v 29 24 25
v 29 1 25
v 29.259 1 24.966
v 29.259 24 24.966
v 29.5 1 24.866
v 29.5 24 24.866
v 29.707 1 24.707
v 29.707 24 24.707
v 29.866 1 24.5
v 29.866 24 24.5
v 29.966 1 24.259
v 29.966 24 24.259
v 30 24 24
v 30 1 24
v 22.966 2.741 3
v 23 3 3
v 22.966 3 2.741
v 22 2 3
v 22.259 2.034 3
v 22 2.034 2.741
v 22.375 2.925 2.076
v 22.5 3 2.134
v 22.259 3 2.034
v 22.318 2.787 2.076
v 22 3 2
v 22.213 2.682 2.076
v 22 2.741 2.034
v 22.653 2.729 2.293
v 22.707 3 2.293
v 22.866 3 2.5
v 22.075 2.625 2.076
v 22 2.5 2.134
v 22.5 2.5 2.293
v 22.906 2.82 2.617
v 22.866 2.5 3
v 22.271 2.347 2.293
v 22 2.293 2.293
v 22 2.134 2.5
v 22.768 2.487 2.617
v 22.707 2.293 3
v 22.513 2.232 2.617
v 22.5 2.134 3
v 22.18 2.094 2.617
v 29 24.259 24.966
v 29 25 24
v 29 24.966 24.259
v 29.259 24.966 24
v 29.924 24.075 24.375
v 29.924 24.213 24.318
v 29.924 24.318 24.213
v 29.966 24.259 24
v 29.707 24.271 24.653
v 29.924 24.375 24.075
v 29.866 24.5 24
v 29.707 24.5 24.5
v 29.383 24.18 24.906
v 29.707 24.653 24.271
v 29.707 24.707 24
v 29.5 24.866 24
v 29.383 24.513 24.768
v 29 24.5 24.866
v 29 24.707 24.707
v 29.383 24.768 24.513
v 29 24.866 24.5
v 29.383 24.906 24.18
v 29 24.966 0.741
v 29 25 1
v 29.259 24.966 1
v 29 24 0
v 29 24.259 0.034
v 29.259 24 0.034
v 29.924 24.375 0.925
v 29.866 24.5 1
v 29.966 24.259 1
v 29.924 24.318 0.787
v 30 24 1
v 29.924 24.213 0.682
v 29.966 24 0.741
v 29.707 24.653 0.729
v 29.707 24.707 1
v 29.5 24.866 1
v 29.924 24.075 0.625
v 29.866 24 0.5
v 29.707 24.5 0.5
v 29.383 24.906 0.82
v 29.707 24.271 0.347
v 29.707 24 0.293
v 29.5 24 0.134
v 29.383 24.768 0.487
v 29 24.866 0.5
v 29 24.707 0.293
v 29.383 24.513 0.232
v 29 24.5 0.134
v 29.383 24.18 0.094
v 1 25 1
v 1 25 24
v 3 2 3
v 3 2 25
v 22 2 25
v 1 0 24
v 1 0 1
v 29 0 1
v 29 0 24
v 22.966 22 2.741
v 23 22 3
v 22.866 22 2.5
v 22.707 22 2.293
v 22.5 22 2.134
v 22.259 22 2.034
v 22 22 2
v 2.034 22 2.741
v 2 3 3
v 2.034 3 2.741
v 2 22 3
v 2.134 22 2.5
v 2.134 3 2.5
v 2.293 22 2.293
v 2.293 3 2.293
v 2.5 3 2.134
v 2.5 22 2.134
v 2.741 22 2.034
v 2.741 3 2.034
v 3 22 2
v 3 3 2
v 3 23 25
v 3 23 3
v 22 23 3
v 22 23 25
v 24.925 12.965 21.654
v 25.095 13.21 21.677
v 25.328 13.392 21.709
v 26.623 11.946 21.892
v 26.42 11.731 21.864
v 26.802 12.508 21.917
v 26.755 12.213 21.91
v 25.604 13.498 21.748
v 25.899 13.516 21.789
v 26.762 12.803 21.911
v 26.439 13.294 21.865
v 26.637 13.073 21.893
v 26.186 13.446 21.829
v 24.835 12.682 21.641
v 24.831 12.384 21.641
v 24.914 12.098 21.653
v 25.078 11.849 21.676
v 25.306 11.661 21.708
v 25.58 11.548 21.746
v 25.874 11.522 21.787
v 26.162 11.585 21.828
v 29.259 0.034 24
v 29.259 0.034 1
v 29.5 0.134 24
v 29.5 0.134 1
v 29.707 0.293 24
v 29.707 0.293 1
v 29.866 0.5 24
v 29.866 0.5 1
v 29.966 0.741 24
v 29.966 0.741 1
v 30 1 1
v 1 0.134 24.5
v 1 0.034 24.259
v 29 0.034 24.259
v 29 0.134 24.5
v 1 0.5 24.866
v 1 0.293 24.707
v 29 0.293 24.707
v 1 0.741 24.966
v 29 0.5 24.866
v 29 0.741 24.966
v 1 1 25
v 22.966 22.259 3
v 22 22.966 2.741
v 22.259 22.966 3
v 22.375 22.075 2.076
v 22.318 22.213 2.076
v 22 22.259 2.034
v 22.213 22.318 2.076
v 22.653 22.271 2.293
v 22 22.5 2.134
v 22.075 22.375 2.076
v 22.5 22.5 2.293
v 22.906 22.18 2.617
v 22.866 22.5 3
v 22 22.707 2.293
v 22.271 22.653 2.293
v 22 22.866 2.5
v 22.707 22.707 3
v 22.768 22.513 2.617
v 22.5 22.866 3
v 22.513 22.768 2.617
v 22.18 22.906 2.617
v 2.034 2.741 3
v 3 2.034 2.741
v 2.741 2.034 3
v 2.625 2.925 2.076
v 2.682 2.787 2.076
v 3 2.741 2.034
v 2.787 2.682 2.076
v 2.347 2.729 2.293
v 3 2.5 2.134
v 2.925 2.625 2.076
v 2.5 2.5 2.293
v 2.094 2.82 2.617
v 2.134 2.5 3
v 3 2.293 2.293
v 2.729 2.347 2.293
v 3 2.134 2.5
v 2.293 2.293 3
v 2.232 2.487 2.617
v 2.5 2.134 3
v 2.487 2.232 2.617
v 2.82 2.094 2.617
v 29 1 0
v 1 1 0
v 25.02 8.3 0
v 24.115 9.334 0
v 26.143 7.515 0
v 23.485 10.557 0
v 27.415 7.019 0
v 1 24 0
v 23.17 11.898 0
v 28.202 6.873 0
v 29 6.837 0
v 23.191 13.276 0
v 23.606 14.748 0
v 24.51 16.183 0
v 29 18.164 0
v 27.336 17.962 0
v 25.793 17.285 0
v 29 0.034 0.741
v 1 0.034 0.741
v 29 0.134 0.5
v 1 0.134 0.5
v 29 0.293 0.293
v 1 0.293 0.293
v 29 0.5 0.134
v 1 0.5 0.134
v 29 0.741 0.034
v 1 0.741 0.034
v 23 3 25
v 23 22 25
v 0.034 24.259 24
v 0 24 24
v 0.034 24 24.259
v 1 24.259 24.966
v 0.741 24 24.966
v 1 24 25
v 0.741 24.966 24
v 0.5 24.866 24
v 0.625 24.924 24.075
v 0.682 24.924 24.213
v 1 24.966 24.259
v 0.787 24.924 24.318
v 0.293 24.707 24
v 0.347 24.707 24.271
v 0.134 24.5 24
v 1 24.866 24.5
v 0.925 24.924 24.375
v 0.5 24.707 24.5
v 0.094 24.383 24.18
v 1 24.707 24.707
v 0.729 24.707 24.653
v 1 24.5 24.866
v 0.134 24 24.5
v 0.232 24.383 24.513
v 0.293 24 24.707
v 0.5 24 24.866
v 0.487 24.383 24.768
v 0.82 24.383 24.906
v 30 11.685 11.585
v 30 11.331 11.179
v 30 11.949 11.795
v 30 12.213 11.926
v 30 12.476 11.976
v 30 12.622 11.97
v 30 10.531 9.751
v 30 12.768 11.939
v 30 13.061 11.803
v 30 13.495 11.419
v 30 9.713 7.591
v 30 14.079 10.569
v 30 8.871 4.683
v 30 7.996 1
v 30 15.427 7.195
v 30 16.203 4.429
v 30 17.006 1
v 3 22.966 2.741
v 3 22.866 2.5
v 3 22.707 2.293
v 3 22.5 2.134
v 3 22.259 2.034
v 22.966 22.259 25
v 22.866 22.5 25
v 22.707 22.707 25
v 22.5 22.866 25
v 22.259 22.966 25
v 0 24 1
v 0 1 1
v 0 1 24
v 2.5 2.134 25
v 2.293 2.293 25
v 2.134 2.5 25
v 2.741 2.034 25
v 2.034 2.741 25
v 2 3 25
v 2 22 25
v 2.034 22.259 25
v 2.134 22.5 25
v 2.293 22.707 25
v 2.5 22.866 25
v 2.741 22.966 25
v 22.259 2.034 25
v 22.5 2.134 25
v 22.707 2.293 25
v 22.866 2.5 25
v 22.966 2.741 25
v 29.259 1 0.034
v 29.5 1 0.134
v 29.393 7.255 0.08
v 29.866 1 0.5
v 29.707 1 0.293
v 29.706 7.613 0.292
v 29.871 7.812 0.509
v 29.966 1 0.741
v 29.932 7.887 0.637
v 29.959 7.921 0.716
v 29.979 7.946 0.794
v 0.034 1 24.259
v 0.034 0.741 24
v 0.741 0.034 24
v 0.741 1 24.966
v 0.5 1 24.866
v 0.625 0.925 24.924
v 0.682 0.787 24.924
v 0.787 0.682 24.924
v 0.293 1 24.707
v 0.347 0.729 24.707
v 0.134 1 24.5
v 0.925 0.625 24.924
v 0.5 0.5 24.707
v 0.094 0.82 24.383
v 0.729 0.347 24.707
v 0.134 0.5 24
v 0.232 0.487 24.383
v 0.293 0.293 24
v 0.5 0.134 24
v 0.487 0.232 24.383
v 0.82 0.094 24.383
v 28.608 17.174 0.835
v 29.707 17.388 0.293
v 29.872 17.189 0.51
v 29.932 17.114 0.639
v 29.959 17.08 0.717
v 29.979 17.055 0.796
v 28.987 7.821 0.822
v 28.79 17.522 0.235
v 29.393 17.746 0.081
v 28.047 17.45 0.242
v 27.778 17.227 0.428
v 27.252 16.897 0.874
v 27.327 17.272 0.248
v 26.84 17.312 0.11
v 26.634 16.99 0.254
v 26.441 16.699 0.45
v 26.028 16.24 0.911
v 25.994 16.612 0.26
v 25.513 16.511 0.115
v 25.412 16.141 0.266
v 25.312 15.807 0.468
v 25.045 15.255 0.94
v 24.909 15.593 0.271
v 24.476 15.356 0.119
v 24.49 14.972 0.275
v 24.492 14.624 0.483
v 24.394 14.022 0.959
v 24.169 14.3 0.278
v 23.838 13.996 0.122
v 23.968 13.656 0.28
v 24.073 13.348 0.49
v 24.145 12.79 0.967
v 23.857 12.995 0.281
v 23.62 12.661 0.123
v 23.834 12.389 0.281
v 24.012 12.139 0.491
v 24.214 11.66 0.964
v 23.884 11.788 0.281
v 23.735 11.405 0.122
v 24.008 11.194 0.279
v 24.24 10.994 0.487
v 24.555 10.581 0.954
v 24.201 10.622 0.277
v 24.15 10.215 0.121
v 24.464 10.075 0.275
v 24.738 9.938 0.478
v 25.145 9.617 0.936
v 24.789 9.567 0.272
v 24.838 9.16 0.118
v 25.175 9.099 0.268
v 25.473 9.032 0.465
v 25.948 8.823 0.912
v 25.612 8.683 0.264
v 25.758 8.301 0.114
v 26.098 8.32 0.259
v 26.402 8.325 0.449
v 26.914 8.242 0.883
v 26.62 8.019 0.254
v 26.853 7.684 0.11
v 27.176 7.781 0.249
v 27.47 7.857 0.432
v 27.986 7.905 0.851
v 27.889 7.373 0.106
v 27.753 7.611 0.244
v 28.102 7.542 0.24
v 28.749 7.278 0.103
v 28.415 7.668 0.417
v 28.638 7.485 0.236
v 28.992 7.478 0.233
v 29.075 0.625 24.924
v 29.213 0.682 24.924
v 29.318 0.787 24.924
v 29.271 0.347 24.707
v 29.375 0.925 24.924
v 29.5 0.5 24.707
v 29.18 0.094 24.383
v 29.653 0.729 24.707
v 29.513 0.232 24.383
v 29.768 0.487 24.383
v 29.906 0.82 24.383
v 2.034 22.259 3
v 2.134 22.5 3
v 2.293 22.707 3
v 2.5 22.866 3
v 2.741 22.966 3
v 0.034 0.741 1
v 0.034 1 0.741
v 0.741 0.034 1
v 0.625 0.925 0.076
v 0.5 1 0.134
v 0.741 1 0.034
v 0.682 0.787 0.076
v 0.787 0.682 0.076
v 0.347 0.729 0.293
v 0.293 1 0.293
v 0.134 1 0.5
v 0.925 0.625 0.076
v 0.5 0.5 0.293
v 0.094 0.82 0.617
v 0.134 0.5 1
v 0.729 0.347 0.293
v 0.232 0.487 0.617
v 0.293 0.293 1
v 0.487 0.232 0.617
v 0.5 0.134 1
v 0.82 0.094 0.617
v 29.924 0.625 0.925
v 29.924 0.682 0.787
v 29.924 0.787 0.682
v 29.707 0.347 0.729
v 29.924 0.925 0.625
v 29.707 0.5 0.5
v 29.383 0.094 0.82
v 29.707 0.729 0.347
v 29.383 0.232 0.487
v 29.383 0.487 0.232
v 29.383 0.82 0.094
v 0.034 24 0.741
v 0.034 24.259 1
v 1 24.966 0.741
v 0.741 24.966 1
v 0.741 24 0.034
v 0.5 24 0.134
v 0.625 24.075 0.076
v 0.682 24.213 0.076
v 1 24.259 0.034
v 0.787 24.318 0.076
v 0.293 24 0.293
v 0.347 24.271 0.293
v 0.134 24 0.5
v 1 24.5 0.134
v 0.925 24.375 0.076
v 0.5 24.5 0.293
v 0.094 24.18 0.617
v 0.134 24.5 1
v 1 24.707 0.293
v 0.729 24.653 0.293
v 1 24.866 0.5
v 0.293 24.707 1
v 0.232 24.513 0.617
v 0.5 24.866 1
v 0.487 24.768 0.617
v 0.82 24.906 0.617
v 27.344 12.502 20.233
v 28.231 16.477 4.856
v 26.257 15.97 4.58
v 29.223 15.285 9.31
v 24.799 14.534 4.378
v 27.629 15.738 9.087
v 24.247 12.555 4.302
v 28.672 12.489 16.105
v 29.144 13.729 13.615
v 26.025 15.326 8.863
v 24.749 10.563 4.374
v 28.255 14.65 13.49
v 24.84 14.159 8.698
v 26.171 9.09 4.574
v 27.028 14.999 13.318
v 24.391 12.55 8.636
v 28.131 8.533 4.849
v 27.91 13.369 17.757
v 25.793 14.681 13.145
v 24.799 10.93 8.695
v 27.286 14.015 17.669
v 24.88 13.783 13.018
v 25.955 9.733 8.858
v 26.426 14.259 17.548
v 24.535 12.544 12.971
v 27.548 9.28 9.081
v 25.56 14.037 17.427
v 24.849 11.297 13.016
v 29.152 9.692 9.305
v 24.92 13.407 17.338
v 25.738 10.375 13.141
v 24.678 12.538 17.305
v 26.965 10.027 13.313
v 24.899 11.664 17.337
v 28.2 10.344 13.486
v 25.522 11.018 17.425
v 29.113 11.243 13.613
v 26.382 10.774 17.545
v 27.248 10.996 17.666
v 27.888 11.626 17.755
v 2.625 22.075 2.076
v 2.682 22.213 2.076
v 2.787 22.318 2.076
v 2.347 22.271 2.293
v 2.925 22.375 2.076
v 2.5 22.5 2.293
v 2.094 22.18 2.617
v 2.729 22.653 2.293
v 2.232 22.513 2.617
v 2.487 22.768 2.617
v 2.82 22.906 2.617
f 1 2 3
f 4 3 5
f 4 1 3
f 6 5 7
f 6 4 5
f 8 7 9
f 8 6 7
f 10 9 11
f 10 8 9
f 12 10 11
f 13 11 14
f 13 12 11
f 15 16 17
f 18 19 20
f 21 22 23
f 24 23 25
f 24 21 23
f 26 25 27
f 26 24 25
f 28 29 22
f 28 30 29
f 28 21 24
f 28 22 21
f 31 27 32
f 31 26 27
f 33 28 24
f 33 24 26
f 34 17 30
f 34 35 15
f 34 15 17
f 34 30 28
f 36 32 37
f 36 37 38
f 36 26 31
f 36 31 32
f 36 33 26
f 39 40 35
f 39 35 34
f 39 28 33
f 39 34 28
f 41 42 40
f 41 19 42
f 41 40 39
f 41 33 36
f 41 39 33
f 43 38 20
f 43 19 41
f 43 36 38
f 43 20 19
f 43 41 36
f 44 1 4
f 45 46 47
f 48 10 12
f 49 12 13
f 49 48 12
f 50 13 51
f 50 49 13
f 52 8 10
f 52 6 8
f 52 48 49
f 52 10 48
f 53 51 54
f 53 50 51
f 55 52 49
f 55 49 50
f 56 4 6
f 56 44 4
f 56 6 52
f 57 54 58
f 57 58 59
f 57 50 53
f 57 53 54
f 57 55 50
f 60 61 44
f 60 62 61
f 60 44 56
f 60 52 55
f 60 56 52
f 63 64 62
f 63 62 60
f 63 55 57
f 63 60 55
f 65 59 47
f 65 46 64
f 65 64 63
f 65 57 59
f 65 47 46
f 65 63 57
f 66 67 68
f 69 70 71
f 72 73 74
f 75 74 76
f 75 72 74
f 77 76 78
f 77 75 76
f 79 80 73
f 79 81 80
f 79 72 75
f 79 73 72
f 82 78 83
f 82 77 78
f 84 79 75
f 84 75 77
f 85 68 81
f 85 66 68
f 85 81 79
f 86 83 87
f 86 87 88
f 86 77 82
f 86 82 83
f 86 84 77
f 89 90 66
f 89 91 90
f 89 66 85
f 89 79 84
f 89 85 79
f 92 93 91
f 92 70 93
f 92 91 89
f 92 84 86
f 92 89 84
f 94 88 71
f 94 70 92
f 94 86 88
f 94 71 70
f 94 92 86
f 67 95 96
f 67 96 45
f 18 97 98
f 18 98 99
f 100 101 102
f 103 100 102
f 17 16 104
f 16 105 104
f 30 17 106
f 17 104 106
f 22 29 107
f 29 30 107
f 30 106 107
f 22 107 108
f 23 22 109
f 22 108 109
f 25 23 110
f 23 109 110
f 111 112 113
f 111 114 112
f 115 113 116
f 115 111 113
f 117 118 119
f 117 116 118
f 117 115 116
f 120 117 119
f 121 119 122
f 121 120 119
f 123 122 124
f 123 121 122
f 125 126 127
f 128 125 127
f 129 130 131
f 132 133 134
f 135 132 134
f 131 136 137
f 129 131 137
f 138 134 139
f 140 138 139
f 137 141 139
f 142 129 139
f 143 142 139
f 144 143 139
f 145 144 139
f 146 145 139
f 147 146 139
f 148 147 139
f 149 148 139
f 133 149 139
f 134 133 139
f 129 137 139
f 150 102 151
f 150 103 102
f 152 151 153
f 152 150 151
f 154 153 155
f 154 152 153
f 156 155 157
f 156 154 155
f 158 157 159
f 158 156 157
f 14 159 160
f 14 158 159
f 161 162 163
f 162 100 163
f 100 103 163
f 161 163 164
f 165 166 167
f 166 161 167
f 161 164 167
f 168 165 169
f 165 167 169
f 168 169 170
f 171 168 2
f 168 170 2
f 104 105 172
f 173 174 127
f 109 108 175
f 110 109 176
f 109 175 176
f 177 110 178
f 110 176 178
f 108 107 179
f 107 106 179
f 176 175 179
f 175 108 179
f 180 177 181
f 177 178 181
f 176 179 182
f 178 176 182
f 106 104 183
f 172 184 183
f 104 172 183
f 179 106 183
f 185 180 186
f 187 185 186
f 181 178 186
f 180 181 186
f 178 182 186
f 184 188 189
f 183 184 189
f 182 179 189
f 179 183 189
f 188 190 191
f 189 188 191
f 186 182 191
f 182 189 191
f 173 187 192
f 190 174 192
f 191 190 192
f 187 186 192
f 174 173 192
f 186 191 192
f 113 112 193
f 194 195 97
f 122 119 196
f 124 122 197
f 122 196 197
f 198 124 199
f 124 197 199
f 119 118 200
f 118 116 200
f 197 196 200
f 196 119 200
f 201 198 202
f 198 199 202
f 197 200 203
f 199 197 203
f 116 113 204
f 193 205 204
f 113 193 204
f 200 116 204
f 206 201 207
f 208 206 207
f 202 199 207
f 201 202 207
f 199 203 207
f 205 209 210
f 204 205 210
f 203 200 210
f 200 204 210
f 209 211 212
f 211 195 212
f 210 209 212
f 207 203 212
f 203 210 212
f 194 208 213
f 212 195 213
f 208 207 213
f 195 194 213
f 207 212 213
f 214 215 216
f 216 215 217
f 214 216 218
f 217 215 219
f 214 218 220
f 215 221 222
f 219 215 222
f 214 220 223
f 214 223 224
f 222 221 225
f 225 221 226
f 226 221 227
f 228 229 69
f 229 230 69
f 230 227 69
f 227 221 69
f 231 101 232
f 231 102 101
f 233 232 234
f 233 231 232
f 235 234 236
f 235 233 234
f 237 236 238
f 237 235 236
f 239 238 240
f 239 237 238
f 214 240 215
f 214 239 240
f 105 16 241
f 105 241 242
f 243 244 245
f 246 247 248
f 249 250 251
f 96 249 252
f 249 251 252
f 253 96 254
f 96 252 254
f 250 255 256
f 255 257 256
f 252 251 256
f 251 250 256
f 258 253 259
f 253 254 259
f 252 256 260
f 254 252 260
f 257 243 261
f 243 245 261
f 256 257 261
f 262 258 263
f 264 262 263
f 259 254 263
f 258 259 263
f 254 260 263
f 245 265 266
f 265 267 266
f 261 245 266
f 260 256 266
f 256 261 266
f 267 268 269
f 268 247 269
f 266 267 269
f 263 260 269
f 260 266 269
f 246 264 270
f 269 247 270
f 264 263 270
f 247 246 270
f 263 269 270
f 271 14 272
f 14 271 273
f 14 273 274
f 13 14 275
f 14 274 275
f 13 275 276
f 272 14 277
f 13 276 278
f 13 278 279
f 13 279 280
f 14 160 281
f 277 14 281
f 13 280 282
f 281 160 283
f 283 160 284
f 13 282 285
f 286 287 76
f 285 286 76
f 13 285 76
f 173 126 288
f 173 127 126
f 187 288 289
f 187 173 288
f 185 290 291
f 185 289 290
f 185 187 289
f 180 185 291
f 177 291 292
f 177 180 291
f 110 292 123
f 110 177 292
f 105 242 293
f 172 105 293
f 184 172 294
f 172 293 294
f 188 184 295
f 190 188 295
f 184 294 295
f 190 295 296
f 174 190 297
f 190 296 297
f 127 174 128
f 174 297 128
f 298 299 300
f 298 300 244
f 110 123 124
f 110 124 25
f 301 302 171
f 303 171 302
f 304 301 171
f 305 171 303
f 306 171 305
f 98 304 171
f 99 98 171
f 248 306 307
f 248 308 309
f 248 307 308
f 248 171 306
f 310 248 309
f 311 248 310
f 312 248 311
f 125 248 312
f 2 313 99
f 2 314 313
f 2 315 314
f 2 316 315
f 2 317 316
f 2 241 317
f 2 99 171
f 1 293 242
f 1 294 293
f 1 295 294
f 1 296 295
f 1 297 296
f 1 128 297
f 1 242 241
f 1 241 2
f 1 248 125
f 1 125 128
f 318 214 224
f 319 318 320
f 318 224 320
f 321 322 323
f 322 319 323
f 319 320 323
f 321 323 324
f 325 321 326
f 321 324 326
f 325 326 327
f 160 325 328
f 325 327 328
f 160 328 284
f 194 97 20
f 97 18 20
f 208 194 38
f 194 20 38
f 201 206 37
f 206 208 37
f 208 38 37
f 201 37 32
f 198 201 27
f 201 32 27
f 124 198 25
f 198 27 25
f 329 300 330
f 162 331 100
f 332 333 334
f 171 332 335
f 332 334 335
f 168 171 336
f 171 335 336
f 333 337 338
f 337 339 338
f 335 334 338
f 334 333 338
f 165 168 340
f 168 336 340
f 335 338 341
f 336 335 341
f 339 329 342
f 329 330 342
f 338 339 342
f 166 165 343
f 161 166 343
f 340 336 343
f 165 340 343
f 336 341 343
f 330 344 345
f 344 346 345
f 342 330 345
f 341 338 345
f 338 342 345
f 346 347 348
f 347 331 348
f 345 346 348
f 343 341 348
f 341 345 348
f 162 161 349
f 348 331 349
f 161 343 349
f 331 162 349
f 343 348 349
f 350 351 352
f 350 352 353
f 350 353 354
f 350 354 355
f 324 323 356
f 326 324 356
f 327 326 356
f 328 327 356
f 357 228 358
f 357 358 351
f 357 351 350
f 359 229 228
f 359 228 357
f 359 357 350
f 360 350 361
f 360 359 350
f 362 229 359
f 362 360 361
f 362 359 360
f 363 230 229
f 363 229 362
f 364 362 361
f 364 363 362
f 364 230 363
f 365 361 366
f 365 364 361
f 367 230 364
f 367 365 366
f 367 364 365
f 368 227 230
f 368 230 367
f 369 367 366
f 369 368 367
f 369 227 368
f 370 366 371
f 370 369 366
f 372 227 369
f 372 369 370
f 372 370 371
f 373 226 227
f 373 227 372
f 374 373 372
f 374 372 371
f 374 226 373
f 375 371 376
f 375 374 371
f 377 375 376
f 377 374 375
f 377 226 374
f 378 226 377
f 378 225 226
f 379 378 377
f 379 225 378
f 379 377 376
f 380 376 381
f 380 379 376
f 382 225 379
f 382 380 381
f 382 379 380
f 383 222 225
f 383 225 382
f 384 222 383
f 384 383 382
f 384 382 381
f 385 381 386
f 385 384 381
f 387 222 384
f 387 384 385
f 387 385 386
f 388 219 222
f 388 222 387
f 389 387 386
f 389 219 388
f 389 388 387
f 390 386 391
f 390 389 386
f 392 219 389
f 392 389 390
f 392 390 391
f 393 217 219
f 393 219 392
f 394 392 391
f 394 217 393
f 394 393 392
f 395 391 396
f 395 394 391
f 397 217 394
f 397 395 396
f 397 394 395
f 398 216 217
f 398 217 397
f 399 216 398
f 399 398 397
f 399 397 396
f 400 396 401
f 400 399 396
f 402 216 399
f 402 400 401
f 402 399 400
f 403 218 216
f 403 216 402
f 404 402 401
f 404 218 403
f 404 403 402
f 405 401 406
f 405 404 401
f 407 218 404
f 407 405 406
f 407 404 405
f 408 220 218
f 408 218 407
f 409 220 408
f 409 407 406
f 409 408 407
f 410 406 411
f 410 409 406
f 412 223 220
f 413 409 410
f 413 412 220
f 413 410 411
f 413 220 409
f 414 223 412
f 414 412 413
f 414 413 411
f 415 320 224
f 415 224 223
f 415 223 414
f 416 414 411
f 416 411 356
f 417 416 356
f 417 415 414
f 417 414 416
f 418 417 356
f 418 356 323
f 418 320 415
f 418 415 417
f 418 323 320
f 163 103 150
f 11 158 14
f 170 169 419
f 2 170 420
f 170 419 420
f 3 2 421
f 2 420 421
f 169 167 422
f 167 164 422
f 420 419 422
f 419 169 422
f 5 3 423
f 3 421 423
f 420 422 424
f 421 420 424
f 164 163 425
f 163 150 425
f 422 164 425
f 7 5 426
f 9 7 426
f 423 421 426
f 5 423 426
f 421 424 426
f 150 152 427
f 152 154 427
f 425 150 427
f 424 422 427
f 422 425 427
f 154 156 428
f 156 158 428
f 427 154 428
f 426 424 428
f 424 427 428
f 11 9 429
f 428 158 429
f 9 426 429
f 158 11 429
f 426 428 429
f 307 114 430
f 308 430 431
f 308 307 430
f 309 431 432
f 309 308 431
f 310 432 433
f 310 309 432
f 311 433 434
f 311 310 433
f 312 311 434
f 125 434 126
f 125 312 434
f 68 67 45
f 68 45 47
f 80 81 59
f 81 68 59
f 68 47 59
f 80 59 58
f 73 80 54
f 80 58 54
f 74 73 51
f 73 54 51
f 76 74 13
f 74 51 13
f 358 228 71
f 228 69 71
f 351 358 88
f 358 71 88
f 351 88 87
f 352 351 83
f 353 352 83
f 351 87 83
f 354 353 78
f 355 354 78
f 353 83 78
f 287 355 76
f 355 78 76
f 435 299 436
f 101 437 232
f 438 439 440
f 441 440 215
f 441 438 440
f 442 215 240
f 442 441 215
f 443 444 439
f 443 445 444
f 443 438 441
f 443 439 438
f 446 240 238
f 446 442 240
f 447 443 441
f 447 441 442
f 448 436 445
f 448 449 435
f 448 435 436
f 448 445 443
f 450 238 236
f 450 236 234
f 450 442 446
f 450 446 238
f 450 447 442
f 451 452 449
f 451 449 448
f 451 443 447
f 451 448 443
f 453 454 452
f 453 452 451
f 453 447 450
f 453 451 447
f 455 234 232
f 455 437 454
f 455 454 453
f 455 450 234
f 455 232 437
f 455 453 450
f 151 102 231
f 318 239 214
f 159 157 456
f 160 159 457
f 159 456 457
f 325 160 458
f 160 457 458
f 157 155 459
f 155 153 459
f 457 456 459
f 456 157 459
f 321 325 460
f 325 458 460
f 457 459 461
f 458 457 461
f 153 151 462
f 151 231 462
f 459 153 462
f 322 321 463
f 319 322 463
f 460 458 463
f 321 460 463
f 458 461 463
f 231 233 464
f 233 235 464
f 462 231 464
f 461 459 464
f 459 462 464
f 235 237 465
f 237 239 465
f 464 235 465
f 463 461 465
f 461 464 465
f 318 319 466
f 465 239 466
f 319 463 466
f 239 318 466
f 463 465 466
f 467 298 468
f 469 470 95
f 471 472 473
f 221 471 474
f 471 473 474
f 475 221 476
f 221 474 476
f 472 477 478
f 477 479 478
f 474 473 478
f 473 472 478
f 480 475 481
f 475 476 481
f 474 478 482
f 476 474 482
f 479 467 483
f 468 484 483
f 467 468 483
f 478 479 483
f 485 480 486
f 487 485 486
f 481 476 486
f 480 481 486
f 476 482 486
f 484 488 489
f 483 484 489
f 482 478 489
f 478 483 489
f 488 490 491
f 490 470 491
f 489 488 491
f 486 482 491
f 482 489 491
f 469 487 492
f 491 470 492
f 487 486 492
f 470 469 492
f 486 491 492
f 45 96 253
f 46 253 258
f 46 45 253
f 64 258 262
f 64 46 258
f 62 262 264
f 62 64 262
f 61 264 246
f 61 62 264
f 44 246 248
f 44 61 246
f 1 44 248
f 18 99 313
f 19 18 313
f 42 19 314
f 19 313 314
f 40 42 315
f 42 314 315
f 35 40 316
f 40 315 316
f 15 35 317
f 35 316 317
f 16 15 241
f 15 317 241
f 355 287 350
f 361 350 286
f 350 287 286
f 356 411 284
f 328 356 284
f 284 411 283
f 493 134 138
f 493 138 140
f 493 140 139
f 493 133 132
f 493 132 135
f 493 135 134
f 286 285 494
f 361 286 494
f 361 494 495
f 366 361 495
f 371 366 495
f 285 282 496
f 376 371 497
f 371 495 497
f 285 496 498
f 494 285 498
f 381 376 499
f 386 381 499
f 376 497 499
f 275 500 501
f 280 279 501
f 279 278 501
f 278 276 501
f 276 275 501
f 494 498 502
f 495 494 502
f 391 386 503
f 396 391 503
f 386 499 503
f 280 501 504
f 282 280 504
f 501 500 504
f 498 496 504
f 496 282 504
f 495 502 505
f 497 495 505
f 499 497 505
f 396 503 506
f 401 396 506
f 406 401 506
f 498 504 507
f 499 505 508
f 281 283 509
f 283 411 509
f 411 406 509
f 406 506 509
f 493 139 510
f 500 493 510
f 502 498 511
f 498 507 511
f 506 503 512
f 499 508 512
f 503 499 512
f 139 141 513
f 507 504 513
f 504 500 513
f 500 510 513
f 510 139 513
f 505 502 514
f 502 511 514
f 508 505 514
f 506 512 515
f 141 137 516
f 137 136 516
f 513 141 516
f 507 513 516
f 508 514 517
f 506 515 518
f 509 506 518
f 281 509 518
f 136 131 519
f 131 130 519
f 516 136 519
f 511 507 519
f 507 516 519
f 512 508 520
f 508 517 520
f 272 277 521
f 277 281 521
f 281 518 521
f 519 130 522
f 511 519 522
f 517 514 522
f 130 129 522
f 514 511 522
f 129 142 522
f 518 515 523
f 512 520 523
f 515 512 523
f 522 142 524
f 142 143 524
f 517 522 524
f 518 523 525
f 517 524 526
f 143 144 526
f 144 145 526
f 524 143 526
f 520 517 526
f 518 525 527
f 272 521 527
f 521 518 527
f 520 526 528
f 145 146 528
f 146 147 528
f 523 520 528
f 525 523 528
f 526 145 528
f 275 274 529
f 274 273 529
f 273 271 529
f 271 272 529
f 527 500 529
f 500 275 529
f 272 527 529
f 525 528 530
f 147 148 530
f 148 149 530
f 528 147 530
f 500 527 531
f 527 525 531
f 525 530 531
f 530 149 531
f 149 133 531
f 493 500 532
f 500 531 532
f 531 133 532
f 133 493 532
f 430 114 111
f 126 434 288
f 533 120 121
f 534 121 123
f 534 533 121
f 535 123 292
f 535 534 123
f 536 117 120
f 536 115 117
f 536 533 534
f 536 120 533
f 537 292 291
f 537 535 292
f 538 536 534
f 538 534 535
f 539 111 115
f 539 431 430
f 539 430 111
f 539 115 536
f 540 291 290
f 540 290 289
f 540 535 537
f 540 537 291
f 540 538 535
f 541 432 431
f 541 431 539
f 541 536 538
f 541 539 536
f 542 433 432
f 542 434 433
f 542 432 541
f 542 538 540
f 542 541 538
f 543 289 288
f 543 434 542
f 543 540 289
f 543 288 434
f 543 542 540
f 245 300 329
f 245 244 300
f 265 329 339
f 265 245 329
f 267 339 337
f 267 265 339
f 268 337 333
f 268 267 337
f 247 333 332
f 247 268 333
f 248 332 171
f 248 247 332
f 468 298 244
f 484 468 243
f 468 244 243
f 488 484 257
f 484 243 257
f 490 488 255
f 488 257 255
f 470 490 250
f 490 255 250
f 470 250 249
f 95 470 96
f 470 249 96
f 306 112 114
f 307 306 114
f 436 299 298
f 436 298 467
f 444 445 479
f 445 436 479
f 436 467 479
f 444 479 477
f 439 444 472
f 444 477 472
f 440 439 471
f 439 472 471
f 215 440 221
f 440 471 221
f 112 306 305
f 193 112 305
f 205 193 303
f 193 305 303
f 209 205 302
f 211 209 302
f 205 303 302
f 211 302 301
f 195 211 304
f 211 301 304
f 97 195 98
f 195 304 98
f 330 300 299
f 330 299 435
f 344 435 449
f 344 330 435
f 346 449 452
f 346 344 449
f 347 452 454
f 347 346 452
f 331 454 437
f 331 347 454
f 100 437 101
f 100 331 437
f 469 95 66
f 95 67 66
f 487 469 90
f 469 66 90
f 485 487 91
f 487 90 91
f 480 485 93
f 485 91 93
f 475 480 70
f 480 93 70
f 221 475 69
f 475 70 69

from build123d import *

# Parameters (mm, degrees)
BOX001_W             = 21
BOX001_H             = 21
BOX001_DEPTH         = 24
FILLET_R             = 1
CONE_ROLL_ANGLE      = 0.050765
CONE_PITCH_ANGLE     = -7.966932
CONE_PLACEMENT_ANGLE = -0.72899
BOX_W                = 30
BOX_H                = 25
BOX_DEPTH            = 25
FILLET001_R          = 1


with BuildPart() as fillet_body:
    # Box001 → Box001 (new body)
    with BuildSketch(Plane(origin=(2, 2, 2), x_dir=(1, 0, 0), z_dir=(0, 0, 1))):
        with Locations((10.5, 10.5)):
            Rectangle(BOX001_W, BOX001_H)
    extrude(amount=BOX001_DEPTH)

    # Fillet
    fillet_edges = [fillet_body.edges().sort_by_distance(p)[0] for p in [
        (2, 2, 14),
        (2, 23, 14),
        (2, 12.5, 2),
        (23, 2, 14),
        (23, 23, 14),
        (23, 12.5, 2),
        (12.5, 2, 2),
        (12.5, 23, 2),
    ]]
    fillet(fillet_edges, radius=FILLET_R)


with BuildPart() as cone:
    # Cone → Cone (revolve)
    with BuildSketch(Plane.XZ):
        Polygon((0, 0), (5, 0), (1, 23), (0, 23), align=None)
    revolve(axis=Axis((0, 0, 0), (0, 0, 1)))


with BuildPart() as cone_1:
    # Cone roll: moved
    add(cone.part.rotate(Axis((0, 0, 0), (1, 0, 0)), CONE_ROLL_ANGLE))


with BuildPart() as cone_2:
    # Cone pitch: moved
    add(cone_1.part.rotate(Axis((0, 0, 0), (0, 1, 0)), CONE_PITCH_ANGLE))


with BuildPart() as cone_3:
    # Cone placement: moved
    add(cone_2.part.moved(Location((29, 12.5, -1))).rotate(Axis((29, 12.5, -1), (0, 0, 1)), CONE_PLACEMENT_ANGLE))


with BuildPart() as fillet001:
    # Box → Box (new body)
    with BuildSketch(Plane.XY):
        with Locations((15, 12.5)):
            Rectangle(BOX_W, BOX_H)
    extrude(amount=BOX_DEPTH)

    # Cut: cut Cone
    add(cone_3.part, mode=Mode.SUBTRACT)

    # Cut001: cut Fillet body
    add(fillet_body.part, mode=Mode.SUBTRACT)

    # Fillet001
    fillet001_edges = [fillet001.edges().sort_by_distance(p)[0] for p in [
        (0, 0, 12.5),
        (0, 12.5, 25),
        (0, 25, 12.5),
        (0, 12.5, 0),
        (15, 0, 0),
        (30, 0, 12.5),
        (15, 0, 25),
        (15, 25, 25),
        (30, 12.5, 25),
        (15, 25, 0),
        (30, 25, 12.5),
        (30, 21.109354, 0),
        (24.104388, 12.500455, 0),
        (30, 3.890653, 0),
    ]]
    fillet(fillet001_edges, radius=FILLET001_R)


solid = fillet001.part
